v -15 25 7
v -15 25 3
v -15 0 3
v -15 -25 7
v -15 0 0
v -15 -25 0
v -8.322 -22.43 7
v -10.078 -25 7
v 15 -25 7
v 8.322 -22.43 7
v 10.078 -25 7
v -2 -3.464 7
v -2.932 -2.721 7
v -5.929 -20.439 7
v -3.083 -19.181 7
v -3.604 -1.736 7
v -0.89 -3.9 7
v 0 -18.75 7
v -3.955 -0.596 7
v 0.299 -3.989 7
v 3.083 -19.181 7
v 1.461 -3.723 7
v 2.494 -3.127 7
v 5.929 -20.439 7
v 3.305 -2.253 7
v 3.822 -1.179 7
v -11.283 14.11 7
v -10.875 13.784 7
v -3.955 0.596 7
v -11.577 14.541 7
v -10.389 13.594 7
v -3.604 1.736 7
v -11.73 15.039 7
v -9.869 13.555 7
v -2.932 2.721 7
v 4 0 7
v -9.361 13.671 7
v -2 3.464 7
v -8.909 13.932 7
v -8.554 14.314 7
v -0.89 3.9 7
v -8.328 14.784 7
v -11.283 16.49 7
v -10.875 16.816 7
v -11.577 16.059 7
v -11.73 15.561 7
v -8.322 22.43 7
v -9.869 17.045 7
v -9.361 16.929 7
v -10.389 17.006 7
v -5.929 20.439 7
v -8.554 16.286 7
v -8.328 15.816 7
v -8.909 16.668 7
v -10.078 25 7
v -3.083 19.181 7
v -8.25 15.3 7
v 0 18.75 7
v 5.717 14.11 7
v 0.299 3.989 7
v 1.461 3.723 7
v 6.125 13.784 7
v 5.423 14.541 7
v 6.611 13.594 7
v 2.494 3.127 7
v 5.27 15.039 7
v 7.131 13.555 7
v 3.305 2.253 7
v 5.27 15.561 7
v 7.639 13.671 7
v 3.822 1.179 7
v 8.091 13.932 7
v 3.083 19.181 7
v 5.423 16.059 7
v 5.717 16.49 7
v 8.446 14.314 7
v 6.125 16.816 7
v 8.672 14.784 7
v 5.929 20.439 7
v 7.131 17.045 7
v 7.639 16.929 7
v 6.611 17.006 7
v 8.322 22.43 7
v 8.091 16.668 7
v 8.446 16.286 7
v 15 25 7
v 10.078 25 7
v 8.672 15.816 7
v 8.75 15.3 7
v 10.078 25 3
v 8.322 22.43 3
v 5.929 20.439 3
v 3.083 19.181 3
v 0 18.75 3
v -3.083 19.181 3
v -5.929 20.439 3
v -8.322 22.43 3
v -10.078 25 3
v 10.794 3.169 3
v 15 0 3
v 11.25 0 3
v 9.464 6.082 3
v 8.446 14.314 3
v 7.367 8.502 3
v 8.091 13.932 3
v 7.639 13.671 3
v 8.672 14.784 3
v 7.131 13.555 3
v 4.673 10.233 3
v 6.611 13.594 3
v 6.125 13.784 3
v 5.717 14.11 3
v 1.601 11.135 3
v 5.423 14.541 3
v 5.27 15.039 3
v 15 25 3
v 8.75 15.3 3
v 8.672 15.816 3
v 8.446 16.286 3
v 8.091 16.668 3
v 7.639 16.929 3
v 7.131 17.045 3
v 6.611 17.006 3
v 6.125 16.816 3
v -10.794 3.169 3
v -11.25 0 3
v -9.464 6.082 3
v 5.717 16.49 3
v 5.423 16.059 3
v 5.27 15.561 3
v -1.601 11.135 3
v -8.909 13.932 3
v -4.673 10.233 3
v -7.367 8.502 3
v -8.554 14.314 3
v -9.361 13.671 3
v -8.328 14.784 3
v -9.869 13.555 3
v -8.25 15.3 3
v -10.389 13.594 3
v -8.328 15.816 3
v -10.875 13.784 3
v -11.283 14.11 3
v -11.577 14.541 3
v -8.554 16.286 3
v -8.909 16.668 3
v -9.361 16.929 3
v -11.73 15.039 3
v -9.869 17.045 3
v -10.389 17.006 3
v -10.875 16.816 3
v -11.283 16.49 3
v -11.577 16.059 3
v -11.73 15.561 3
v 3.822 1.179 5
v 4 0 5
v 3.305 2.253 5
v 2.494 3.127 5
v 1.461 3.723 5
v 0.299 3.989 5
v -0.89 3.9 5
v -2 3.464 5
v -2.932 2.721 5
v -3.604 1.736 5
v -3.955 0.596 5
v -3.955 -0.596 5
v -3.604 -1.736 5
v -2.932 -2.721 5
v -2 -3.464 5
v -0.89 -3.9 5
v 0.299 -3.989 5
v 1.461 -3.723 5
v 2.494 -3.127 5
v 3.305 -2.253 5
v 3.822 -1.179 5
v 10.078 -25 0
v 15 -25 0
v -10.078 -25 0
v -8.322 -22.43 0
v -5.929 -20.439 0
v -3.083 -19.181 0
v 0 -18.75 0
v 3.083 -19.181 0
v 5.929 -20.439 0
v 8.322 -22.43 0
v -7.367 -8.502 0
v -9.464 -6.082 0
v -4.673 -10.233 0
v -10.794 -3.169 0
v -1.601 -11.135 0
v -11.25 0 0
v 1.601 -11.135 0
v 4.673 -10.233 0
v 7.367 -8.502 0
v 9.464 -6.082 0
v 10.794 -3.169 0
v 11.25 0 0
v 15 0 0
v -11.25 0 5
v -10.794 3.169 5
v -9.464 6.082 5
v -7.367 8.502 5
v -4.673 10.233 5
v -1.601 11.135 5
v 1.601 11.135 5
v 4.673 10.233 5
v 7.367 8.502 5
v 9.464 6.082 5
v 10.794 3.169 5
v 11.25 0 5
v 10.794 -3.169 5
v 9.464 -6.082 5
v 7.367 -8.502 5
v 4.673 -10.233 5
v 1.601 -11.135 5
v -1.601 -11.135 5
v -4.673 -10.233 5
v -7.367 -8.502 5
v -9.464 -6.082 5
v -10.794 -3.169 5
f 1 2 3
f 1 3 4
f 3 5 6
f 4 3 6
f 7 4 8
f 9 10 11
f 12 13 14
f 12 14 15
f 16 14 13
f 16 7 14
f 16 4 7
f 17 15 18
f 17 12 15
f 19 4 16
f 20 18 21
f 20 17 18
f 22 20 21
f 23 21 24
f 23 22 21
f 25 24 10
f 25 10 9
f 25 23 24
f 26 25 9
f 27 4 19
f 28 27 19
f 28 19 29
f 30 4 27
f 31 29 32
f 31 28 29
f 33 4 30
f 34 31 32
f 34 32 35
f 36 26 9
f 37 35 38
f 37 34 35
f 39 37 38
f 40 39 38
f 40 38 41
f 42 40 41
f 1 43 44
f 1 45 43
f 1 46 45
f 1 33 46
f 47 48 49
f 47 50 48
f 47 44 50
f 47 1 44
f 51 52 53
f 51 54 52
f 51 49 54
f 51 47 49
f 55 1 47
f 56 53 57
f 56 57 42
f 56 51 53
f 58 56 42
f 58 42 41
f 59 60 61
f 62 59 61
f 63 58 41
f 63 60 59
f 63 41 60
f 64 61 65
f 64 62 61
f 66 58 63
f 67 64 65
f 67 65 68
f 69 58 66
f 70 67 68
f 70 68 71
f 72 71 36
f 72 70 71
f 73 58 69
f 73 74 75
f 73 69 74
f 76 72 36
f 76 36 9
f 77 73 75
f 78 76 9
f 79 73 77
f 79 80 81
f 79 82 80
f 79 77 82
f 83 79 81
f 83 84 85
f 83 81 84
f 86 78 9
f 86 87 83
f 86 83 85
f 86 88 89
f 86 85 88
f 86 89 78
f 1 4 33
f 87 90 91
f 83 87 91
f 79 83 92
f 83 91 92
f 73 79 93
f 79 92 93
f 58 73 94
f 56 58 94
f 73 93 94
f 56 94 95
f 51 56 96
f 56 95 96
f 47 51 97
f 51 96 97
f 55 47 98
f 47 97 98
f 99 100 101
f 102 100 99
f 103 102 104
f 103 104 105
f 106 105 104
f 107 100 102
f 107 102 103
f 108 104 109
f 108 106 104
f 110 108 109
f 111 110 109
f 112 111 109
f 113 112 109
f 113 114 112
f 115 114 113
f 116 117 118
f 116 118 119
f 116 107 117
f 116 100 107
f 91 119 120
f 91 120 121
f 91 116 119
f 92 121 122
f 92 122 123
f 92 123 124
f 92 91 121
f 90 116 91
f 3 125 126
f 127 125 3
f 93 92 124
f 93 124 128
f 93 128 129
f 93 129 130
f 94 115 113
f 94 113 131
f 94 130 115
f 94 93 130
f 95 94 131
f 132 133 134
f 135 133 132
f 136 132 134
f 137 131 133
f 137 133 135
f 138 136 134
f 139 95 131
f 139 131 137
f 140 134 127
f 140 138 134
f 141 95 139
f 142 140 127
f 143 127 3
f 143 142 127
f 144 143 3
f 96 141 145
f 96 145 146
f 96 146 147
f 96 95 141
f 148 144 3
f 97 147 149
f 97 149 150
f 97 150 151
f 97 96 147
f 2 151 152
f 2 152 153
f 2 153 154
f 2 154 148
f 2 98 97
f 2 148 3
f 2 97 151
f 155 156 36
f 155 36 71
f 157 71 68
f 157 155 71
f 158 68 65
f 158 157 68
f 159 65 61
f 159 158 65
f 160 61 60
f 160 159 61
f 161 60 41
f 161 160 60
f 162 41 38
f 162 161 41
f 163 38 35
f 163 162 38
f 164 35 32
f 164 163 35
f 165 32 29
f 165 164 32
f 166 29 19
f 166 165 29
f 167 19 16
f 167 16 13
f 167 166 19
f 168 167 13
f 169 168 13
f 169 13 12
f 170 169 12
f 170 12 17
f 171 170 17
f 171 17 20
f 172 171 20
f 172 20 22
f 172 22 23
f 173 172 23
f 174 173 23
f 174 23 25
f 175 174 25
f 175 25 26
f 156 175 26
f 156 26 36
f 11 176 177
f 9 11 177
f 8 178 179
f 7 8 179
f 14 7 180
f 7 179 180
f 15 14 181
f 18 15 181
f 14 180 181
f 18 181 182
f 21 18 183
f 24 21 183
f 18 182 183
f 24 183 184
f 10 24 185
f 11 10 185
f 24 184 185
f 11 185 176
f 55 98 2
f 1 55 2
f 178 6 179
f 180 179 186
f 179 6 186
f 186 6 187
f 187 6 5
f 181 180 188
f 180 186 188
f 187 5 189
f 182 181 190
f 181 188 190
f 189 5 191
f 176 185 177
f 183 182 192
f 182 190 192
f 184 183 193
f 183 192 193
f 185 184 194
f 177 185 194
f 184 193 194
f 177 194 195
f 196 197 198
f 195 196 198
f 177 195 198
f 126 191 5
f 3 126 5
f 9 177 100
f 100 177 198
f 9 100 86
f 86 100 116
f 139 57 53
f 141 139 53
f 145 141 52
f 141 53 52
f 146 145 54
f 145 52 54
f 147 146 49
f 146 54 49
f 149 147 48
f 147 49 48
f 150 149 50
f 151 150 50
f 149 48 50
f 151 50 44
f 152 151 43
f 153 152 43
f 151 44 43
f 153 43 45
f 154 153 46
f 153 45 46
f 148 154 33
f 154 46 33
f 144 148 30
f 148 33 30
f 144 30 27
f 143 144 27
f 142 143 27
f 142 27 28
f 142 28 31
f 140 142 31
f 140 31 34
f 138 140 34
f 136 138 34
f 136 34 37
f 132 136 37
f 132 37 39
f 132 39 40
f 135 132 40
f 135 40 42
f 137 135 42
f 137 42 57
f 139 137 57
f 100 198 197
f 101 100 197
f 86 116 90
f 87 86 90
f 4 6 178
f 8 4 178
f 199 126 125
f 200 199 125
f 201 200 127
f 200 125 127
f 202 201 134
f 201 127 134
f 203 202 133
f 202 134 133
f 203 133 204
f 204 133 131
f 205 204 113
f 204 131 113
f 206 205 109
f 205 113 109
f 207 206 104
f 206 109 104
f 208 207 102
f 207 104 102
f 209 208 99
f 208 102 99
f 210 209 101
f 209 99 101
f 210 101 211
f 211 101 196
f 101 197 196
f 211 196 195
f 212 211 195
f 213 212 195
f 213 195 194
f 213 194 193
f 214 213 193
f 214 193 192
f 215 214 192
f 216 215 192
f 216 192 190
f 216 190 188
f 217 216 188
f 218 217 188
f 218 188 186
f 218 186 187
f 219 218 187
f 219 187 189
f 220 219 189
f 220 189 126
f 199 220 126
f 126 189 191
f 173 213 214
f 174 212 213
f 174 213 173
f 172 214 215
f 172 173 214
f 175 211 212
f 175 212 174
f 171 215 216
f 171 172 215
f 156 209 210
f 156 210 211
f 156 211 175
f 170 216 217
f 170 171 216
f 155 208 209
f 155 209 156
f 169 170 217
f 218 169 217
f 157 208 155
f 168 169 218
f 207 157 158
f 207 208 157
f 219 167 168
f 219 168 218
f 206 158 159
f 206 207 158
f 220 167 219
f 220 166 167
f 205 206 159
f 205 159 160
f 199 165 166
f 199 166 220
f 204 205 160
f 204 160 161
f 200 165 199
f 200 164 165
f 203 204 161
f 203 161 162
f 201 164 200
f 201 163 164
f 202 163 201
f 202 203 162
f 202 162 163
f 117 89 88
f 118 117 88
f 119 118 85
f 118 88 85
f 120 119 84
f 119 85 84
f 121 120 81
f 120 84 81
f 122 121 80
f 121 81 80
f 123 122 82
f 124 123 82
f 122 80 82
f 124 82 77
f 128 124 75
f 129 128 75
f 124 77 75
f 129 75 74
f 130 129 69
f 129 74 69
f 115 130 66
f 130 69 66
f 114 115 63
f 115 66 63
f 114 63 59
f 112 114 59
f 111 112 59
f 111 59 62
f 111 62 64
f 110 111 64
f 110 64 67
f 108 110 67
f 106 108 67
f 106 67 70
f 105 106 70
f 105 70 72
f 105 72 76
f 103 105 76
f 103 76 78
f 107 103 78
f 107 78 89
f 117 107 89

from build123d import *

# Parameters (mm, degrees)
SKETCH_1_R          = 4
EXTRUDE_1_DEPTH     = 7
SKETCH_3_R          = 1.75
CUT_EXTRUDE_2_DEPTH = 10
CUT_EXTRUDE_4_DEPTH = 3
SKETCH_6_R          = 11.25
CUT_EXTRUDE_5_DEPTH = 5


with BuildPart() as part:
    # Эскиз1 → Бобышка-Вытянуть1 (new body)
    with BuildSketch(Plane.XY):
        with BuildLine():
            Line((-15, -25), (-10.077822185, -25))
            ThreePointArc((-10.077822185, -25), (0, -18.75), (10.077822185, -25))
            Line((10.077822185, -25), (15, -25))
            Line((15, -25), (15, 25))
            Line((15, 25), (10.077822185, 25))
            ThreePointArc((10.077822185, 25), (0, 18.75), (-10.077822185, 25))
            Line((-10.077822185, 25), (-15, 25))
            Line((-15, 25), (-15, -25))
        make_face()
        Circle(SKETCH_1_R, mode=Mode.SUBTRACT)
    extrude(amount=EXTRUDE_1_DEPTH)

    # Эскиз3 → Вырез-Вытянуть2 (cut)
    with BuildSketch(Plane.XY.offset(7)):
        with Locations((-10, 15.3)):
            Circle(SKETCH_3_R)
        with Locations((7, 15.3)):
            Circle(SKETCH_3_R)
    extrude(amount=-CUT_EXTRUDE_2_DEPTH, mode=Mode.SUBTRACT)

    # Эскиз4 → Вырез-Вытянуть4 (cut)
    with BuildSketch(Plane(origin=(0, 0, 0), x_dir=(-1, 0, 0), z_dir=(0, 0, -1))):
        with BuildLine():
            Line((-15, 0), (-4, 0))
            ThreePointArc((-4, 0), (0, 4), (4, 0))
            Line((4, 0), (15, 0))
            Line((15, 0), (15, 25))
            Line((15, 25), (-15, 25))
            Line((-15, 25), (-15, 0))
        make_face()
    extrude(amount=-CUT_EXTRUDE_4_DEPTH, mode=Mode.SUBTRACT)

    # Эскиз6 → Вырез-Вытянуть5 (cut)
    with BuildSketch(Plane(origin=(0, 0, 0), x_dir=(-1, 0, 0), z_dir=(0, 0, -1))):
        Circle(SKETCH_6_R)
    extrude(amount=-CUT_EXTRUDE_5_DEPTH, mode=Mode.SUBTRACT)


solid = part.part
